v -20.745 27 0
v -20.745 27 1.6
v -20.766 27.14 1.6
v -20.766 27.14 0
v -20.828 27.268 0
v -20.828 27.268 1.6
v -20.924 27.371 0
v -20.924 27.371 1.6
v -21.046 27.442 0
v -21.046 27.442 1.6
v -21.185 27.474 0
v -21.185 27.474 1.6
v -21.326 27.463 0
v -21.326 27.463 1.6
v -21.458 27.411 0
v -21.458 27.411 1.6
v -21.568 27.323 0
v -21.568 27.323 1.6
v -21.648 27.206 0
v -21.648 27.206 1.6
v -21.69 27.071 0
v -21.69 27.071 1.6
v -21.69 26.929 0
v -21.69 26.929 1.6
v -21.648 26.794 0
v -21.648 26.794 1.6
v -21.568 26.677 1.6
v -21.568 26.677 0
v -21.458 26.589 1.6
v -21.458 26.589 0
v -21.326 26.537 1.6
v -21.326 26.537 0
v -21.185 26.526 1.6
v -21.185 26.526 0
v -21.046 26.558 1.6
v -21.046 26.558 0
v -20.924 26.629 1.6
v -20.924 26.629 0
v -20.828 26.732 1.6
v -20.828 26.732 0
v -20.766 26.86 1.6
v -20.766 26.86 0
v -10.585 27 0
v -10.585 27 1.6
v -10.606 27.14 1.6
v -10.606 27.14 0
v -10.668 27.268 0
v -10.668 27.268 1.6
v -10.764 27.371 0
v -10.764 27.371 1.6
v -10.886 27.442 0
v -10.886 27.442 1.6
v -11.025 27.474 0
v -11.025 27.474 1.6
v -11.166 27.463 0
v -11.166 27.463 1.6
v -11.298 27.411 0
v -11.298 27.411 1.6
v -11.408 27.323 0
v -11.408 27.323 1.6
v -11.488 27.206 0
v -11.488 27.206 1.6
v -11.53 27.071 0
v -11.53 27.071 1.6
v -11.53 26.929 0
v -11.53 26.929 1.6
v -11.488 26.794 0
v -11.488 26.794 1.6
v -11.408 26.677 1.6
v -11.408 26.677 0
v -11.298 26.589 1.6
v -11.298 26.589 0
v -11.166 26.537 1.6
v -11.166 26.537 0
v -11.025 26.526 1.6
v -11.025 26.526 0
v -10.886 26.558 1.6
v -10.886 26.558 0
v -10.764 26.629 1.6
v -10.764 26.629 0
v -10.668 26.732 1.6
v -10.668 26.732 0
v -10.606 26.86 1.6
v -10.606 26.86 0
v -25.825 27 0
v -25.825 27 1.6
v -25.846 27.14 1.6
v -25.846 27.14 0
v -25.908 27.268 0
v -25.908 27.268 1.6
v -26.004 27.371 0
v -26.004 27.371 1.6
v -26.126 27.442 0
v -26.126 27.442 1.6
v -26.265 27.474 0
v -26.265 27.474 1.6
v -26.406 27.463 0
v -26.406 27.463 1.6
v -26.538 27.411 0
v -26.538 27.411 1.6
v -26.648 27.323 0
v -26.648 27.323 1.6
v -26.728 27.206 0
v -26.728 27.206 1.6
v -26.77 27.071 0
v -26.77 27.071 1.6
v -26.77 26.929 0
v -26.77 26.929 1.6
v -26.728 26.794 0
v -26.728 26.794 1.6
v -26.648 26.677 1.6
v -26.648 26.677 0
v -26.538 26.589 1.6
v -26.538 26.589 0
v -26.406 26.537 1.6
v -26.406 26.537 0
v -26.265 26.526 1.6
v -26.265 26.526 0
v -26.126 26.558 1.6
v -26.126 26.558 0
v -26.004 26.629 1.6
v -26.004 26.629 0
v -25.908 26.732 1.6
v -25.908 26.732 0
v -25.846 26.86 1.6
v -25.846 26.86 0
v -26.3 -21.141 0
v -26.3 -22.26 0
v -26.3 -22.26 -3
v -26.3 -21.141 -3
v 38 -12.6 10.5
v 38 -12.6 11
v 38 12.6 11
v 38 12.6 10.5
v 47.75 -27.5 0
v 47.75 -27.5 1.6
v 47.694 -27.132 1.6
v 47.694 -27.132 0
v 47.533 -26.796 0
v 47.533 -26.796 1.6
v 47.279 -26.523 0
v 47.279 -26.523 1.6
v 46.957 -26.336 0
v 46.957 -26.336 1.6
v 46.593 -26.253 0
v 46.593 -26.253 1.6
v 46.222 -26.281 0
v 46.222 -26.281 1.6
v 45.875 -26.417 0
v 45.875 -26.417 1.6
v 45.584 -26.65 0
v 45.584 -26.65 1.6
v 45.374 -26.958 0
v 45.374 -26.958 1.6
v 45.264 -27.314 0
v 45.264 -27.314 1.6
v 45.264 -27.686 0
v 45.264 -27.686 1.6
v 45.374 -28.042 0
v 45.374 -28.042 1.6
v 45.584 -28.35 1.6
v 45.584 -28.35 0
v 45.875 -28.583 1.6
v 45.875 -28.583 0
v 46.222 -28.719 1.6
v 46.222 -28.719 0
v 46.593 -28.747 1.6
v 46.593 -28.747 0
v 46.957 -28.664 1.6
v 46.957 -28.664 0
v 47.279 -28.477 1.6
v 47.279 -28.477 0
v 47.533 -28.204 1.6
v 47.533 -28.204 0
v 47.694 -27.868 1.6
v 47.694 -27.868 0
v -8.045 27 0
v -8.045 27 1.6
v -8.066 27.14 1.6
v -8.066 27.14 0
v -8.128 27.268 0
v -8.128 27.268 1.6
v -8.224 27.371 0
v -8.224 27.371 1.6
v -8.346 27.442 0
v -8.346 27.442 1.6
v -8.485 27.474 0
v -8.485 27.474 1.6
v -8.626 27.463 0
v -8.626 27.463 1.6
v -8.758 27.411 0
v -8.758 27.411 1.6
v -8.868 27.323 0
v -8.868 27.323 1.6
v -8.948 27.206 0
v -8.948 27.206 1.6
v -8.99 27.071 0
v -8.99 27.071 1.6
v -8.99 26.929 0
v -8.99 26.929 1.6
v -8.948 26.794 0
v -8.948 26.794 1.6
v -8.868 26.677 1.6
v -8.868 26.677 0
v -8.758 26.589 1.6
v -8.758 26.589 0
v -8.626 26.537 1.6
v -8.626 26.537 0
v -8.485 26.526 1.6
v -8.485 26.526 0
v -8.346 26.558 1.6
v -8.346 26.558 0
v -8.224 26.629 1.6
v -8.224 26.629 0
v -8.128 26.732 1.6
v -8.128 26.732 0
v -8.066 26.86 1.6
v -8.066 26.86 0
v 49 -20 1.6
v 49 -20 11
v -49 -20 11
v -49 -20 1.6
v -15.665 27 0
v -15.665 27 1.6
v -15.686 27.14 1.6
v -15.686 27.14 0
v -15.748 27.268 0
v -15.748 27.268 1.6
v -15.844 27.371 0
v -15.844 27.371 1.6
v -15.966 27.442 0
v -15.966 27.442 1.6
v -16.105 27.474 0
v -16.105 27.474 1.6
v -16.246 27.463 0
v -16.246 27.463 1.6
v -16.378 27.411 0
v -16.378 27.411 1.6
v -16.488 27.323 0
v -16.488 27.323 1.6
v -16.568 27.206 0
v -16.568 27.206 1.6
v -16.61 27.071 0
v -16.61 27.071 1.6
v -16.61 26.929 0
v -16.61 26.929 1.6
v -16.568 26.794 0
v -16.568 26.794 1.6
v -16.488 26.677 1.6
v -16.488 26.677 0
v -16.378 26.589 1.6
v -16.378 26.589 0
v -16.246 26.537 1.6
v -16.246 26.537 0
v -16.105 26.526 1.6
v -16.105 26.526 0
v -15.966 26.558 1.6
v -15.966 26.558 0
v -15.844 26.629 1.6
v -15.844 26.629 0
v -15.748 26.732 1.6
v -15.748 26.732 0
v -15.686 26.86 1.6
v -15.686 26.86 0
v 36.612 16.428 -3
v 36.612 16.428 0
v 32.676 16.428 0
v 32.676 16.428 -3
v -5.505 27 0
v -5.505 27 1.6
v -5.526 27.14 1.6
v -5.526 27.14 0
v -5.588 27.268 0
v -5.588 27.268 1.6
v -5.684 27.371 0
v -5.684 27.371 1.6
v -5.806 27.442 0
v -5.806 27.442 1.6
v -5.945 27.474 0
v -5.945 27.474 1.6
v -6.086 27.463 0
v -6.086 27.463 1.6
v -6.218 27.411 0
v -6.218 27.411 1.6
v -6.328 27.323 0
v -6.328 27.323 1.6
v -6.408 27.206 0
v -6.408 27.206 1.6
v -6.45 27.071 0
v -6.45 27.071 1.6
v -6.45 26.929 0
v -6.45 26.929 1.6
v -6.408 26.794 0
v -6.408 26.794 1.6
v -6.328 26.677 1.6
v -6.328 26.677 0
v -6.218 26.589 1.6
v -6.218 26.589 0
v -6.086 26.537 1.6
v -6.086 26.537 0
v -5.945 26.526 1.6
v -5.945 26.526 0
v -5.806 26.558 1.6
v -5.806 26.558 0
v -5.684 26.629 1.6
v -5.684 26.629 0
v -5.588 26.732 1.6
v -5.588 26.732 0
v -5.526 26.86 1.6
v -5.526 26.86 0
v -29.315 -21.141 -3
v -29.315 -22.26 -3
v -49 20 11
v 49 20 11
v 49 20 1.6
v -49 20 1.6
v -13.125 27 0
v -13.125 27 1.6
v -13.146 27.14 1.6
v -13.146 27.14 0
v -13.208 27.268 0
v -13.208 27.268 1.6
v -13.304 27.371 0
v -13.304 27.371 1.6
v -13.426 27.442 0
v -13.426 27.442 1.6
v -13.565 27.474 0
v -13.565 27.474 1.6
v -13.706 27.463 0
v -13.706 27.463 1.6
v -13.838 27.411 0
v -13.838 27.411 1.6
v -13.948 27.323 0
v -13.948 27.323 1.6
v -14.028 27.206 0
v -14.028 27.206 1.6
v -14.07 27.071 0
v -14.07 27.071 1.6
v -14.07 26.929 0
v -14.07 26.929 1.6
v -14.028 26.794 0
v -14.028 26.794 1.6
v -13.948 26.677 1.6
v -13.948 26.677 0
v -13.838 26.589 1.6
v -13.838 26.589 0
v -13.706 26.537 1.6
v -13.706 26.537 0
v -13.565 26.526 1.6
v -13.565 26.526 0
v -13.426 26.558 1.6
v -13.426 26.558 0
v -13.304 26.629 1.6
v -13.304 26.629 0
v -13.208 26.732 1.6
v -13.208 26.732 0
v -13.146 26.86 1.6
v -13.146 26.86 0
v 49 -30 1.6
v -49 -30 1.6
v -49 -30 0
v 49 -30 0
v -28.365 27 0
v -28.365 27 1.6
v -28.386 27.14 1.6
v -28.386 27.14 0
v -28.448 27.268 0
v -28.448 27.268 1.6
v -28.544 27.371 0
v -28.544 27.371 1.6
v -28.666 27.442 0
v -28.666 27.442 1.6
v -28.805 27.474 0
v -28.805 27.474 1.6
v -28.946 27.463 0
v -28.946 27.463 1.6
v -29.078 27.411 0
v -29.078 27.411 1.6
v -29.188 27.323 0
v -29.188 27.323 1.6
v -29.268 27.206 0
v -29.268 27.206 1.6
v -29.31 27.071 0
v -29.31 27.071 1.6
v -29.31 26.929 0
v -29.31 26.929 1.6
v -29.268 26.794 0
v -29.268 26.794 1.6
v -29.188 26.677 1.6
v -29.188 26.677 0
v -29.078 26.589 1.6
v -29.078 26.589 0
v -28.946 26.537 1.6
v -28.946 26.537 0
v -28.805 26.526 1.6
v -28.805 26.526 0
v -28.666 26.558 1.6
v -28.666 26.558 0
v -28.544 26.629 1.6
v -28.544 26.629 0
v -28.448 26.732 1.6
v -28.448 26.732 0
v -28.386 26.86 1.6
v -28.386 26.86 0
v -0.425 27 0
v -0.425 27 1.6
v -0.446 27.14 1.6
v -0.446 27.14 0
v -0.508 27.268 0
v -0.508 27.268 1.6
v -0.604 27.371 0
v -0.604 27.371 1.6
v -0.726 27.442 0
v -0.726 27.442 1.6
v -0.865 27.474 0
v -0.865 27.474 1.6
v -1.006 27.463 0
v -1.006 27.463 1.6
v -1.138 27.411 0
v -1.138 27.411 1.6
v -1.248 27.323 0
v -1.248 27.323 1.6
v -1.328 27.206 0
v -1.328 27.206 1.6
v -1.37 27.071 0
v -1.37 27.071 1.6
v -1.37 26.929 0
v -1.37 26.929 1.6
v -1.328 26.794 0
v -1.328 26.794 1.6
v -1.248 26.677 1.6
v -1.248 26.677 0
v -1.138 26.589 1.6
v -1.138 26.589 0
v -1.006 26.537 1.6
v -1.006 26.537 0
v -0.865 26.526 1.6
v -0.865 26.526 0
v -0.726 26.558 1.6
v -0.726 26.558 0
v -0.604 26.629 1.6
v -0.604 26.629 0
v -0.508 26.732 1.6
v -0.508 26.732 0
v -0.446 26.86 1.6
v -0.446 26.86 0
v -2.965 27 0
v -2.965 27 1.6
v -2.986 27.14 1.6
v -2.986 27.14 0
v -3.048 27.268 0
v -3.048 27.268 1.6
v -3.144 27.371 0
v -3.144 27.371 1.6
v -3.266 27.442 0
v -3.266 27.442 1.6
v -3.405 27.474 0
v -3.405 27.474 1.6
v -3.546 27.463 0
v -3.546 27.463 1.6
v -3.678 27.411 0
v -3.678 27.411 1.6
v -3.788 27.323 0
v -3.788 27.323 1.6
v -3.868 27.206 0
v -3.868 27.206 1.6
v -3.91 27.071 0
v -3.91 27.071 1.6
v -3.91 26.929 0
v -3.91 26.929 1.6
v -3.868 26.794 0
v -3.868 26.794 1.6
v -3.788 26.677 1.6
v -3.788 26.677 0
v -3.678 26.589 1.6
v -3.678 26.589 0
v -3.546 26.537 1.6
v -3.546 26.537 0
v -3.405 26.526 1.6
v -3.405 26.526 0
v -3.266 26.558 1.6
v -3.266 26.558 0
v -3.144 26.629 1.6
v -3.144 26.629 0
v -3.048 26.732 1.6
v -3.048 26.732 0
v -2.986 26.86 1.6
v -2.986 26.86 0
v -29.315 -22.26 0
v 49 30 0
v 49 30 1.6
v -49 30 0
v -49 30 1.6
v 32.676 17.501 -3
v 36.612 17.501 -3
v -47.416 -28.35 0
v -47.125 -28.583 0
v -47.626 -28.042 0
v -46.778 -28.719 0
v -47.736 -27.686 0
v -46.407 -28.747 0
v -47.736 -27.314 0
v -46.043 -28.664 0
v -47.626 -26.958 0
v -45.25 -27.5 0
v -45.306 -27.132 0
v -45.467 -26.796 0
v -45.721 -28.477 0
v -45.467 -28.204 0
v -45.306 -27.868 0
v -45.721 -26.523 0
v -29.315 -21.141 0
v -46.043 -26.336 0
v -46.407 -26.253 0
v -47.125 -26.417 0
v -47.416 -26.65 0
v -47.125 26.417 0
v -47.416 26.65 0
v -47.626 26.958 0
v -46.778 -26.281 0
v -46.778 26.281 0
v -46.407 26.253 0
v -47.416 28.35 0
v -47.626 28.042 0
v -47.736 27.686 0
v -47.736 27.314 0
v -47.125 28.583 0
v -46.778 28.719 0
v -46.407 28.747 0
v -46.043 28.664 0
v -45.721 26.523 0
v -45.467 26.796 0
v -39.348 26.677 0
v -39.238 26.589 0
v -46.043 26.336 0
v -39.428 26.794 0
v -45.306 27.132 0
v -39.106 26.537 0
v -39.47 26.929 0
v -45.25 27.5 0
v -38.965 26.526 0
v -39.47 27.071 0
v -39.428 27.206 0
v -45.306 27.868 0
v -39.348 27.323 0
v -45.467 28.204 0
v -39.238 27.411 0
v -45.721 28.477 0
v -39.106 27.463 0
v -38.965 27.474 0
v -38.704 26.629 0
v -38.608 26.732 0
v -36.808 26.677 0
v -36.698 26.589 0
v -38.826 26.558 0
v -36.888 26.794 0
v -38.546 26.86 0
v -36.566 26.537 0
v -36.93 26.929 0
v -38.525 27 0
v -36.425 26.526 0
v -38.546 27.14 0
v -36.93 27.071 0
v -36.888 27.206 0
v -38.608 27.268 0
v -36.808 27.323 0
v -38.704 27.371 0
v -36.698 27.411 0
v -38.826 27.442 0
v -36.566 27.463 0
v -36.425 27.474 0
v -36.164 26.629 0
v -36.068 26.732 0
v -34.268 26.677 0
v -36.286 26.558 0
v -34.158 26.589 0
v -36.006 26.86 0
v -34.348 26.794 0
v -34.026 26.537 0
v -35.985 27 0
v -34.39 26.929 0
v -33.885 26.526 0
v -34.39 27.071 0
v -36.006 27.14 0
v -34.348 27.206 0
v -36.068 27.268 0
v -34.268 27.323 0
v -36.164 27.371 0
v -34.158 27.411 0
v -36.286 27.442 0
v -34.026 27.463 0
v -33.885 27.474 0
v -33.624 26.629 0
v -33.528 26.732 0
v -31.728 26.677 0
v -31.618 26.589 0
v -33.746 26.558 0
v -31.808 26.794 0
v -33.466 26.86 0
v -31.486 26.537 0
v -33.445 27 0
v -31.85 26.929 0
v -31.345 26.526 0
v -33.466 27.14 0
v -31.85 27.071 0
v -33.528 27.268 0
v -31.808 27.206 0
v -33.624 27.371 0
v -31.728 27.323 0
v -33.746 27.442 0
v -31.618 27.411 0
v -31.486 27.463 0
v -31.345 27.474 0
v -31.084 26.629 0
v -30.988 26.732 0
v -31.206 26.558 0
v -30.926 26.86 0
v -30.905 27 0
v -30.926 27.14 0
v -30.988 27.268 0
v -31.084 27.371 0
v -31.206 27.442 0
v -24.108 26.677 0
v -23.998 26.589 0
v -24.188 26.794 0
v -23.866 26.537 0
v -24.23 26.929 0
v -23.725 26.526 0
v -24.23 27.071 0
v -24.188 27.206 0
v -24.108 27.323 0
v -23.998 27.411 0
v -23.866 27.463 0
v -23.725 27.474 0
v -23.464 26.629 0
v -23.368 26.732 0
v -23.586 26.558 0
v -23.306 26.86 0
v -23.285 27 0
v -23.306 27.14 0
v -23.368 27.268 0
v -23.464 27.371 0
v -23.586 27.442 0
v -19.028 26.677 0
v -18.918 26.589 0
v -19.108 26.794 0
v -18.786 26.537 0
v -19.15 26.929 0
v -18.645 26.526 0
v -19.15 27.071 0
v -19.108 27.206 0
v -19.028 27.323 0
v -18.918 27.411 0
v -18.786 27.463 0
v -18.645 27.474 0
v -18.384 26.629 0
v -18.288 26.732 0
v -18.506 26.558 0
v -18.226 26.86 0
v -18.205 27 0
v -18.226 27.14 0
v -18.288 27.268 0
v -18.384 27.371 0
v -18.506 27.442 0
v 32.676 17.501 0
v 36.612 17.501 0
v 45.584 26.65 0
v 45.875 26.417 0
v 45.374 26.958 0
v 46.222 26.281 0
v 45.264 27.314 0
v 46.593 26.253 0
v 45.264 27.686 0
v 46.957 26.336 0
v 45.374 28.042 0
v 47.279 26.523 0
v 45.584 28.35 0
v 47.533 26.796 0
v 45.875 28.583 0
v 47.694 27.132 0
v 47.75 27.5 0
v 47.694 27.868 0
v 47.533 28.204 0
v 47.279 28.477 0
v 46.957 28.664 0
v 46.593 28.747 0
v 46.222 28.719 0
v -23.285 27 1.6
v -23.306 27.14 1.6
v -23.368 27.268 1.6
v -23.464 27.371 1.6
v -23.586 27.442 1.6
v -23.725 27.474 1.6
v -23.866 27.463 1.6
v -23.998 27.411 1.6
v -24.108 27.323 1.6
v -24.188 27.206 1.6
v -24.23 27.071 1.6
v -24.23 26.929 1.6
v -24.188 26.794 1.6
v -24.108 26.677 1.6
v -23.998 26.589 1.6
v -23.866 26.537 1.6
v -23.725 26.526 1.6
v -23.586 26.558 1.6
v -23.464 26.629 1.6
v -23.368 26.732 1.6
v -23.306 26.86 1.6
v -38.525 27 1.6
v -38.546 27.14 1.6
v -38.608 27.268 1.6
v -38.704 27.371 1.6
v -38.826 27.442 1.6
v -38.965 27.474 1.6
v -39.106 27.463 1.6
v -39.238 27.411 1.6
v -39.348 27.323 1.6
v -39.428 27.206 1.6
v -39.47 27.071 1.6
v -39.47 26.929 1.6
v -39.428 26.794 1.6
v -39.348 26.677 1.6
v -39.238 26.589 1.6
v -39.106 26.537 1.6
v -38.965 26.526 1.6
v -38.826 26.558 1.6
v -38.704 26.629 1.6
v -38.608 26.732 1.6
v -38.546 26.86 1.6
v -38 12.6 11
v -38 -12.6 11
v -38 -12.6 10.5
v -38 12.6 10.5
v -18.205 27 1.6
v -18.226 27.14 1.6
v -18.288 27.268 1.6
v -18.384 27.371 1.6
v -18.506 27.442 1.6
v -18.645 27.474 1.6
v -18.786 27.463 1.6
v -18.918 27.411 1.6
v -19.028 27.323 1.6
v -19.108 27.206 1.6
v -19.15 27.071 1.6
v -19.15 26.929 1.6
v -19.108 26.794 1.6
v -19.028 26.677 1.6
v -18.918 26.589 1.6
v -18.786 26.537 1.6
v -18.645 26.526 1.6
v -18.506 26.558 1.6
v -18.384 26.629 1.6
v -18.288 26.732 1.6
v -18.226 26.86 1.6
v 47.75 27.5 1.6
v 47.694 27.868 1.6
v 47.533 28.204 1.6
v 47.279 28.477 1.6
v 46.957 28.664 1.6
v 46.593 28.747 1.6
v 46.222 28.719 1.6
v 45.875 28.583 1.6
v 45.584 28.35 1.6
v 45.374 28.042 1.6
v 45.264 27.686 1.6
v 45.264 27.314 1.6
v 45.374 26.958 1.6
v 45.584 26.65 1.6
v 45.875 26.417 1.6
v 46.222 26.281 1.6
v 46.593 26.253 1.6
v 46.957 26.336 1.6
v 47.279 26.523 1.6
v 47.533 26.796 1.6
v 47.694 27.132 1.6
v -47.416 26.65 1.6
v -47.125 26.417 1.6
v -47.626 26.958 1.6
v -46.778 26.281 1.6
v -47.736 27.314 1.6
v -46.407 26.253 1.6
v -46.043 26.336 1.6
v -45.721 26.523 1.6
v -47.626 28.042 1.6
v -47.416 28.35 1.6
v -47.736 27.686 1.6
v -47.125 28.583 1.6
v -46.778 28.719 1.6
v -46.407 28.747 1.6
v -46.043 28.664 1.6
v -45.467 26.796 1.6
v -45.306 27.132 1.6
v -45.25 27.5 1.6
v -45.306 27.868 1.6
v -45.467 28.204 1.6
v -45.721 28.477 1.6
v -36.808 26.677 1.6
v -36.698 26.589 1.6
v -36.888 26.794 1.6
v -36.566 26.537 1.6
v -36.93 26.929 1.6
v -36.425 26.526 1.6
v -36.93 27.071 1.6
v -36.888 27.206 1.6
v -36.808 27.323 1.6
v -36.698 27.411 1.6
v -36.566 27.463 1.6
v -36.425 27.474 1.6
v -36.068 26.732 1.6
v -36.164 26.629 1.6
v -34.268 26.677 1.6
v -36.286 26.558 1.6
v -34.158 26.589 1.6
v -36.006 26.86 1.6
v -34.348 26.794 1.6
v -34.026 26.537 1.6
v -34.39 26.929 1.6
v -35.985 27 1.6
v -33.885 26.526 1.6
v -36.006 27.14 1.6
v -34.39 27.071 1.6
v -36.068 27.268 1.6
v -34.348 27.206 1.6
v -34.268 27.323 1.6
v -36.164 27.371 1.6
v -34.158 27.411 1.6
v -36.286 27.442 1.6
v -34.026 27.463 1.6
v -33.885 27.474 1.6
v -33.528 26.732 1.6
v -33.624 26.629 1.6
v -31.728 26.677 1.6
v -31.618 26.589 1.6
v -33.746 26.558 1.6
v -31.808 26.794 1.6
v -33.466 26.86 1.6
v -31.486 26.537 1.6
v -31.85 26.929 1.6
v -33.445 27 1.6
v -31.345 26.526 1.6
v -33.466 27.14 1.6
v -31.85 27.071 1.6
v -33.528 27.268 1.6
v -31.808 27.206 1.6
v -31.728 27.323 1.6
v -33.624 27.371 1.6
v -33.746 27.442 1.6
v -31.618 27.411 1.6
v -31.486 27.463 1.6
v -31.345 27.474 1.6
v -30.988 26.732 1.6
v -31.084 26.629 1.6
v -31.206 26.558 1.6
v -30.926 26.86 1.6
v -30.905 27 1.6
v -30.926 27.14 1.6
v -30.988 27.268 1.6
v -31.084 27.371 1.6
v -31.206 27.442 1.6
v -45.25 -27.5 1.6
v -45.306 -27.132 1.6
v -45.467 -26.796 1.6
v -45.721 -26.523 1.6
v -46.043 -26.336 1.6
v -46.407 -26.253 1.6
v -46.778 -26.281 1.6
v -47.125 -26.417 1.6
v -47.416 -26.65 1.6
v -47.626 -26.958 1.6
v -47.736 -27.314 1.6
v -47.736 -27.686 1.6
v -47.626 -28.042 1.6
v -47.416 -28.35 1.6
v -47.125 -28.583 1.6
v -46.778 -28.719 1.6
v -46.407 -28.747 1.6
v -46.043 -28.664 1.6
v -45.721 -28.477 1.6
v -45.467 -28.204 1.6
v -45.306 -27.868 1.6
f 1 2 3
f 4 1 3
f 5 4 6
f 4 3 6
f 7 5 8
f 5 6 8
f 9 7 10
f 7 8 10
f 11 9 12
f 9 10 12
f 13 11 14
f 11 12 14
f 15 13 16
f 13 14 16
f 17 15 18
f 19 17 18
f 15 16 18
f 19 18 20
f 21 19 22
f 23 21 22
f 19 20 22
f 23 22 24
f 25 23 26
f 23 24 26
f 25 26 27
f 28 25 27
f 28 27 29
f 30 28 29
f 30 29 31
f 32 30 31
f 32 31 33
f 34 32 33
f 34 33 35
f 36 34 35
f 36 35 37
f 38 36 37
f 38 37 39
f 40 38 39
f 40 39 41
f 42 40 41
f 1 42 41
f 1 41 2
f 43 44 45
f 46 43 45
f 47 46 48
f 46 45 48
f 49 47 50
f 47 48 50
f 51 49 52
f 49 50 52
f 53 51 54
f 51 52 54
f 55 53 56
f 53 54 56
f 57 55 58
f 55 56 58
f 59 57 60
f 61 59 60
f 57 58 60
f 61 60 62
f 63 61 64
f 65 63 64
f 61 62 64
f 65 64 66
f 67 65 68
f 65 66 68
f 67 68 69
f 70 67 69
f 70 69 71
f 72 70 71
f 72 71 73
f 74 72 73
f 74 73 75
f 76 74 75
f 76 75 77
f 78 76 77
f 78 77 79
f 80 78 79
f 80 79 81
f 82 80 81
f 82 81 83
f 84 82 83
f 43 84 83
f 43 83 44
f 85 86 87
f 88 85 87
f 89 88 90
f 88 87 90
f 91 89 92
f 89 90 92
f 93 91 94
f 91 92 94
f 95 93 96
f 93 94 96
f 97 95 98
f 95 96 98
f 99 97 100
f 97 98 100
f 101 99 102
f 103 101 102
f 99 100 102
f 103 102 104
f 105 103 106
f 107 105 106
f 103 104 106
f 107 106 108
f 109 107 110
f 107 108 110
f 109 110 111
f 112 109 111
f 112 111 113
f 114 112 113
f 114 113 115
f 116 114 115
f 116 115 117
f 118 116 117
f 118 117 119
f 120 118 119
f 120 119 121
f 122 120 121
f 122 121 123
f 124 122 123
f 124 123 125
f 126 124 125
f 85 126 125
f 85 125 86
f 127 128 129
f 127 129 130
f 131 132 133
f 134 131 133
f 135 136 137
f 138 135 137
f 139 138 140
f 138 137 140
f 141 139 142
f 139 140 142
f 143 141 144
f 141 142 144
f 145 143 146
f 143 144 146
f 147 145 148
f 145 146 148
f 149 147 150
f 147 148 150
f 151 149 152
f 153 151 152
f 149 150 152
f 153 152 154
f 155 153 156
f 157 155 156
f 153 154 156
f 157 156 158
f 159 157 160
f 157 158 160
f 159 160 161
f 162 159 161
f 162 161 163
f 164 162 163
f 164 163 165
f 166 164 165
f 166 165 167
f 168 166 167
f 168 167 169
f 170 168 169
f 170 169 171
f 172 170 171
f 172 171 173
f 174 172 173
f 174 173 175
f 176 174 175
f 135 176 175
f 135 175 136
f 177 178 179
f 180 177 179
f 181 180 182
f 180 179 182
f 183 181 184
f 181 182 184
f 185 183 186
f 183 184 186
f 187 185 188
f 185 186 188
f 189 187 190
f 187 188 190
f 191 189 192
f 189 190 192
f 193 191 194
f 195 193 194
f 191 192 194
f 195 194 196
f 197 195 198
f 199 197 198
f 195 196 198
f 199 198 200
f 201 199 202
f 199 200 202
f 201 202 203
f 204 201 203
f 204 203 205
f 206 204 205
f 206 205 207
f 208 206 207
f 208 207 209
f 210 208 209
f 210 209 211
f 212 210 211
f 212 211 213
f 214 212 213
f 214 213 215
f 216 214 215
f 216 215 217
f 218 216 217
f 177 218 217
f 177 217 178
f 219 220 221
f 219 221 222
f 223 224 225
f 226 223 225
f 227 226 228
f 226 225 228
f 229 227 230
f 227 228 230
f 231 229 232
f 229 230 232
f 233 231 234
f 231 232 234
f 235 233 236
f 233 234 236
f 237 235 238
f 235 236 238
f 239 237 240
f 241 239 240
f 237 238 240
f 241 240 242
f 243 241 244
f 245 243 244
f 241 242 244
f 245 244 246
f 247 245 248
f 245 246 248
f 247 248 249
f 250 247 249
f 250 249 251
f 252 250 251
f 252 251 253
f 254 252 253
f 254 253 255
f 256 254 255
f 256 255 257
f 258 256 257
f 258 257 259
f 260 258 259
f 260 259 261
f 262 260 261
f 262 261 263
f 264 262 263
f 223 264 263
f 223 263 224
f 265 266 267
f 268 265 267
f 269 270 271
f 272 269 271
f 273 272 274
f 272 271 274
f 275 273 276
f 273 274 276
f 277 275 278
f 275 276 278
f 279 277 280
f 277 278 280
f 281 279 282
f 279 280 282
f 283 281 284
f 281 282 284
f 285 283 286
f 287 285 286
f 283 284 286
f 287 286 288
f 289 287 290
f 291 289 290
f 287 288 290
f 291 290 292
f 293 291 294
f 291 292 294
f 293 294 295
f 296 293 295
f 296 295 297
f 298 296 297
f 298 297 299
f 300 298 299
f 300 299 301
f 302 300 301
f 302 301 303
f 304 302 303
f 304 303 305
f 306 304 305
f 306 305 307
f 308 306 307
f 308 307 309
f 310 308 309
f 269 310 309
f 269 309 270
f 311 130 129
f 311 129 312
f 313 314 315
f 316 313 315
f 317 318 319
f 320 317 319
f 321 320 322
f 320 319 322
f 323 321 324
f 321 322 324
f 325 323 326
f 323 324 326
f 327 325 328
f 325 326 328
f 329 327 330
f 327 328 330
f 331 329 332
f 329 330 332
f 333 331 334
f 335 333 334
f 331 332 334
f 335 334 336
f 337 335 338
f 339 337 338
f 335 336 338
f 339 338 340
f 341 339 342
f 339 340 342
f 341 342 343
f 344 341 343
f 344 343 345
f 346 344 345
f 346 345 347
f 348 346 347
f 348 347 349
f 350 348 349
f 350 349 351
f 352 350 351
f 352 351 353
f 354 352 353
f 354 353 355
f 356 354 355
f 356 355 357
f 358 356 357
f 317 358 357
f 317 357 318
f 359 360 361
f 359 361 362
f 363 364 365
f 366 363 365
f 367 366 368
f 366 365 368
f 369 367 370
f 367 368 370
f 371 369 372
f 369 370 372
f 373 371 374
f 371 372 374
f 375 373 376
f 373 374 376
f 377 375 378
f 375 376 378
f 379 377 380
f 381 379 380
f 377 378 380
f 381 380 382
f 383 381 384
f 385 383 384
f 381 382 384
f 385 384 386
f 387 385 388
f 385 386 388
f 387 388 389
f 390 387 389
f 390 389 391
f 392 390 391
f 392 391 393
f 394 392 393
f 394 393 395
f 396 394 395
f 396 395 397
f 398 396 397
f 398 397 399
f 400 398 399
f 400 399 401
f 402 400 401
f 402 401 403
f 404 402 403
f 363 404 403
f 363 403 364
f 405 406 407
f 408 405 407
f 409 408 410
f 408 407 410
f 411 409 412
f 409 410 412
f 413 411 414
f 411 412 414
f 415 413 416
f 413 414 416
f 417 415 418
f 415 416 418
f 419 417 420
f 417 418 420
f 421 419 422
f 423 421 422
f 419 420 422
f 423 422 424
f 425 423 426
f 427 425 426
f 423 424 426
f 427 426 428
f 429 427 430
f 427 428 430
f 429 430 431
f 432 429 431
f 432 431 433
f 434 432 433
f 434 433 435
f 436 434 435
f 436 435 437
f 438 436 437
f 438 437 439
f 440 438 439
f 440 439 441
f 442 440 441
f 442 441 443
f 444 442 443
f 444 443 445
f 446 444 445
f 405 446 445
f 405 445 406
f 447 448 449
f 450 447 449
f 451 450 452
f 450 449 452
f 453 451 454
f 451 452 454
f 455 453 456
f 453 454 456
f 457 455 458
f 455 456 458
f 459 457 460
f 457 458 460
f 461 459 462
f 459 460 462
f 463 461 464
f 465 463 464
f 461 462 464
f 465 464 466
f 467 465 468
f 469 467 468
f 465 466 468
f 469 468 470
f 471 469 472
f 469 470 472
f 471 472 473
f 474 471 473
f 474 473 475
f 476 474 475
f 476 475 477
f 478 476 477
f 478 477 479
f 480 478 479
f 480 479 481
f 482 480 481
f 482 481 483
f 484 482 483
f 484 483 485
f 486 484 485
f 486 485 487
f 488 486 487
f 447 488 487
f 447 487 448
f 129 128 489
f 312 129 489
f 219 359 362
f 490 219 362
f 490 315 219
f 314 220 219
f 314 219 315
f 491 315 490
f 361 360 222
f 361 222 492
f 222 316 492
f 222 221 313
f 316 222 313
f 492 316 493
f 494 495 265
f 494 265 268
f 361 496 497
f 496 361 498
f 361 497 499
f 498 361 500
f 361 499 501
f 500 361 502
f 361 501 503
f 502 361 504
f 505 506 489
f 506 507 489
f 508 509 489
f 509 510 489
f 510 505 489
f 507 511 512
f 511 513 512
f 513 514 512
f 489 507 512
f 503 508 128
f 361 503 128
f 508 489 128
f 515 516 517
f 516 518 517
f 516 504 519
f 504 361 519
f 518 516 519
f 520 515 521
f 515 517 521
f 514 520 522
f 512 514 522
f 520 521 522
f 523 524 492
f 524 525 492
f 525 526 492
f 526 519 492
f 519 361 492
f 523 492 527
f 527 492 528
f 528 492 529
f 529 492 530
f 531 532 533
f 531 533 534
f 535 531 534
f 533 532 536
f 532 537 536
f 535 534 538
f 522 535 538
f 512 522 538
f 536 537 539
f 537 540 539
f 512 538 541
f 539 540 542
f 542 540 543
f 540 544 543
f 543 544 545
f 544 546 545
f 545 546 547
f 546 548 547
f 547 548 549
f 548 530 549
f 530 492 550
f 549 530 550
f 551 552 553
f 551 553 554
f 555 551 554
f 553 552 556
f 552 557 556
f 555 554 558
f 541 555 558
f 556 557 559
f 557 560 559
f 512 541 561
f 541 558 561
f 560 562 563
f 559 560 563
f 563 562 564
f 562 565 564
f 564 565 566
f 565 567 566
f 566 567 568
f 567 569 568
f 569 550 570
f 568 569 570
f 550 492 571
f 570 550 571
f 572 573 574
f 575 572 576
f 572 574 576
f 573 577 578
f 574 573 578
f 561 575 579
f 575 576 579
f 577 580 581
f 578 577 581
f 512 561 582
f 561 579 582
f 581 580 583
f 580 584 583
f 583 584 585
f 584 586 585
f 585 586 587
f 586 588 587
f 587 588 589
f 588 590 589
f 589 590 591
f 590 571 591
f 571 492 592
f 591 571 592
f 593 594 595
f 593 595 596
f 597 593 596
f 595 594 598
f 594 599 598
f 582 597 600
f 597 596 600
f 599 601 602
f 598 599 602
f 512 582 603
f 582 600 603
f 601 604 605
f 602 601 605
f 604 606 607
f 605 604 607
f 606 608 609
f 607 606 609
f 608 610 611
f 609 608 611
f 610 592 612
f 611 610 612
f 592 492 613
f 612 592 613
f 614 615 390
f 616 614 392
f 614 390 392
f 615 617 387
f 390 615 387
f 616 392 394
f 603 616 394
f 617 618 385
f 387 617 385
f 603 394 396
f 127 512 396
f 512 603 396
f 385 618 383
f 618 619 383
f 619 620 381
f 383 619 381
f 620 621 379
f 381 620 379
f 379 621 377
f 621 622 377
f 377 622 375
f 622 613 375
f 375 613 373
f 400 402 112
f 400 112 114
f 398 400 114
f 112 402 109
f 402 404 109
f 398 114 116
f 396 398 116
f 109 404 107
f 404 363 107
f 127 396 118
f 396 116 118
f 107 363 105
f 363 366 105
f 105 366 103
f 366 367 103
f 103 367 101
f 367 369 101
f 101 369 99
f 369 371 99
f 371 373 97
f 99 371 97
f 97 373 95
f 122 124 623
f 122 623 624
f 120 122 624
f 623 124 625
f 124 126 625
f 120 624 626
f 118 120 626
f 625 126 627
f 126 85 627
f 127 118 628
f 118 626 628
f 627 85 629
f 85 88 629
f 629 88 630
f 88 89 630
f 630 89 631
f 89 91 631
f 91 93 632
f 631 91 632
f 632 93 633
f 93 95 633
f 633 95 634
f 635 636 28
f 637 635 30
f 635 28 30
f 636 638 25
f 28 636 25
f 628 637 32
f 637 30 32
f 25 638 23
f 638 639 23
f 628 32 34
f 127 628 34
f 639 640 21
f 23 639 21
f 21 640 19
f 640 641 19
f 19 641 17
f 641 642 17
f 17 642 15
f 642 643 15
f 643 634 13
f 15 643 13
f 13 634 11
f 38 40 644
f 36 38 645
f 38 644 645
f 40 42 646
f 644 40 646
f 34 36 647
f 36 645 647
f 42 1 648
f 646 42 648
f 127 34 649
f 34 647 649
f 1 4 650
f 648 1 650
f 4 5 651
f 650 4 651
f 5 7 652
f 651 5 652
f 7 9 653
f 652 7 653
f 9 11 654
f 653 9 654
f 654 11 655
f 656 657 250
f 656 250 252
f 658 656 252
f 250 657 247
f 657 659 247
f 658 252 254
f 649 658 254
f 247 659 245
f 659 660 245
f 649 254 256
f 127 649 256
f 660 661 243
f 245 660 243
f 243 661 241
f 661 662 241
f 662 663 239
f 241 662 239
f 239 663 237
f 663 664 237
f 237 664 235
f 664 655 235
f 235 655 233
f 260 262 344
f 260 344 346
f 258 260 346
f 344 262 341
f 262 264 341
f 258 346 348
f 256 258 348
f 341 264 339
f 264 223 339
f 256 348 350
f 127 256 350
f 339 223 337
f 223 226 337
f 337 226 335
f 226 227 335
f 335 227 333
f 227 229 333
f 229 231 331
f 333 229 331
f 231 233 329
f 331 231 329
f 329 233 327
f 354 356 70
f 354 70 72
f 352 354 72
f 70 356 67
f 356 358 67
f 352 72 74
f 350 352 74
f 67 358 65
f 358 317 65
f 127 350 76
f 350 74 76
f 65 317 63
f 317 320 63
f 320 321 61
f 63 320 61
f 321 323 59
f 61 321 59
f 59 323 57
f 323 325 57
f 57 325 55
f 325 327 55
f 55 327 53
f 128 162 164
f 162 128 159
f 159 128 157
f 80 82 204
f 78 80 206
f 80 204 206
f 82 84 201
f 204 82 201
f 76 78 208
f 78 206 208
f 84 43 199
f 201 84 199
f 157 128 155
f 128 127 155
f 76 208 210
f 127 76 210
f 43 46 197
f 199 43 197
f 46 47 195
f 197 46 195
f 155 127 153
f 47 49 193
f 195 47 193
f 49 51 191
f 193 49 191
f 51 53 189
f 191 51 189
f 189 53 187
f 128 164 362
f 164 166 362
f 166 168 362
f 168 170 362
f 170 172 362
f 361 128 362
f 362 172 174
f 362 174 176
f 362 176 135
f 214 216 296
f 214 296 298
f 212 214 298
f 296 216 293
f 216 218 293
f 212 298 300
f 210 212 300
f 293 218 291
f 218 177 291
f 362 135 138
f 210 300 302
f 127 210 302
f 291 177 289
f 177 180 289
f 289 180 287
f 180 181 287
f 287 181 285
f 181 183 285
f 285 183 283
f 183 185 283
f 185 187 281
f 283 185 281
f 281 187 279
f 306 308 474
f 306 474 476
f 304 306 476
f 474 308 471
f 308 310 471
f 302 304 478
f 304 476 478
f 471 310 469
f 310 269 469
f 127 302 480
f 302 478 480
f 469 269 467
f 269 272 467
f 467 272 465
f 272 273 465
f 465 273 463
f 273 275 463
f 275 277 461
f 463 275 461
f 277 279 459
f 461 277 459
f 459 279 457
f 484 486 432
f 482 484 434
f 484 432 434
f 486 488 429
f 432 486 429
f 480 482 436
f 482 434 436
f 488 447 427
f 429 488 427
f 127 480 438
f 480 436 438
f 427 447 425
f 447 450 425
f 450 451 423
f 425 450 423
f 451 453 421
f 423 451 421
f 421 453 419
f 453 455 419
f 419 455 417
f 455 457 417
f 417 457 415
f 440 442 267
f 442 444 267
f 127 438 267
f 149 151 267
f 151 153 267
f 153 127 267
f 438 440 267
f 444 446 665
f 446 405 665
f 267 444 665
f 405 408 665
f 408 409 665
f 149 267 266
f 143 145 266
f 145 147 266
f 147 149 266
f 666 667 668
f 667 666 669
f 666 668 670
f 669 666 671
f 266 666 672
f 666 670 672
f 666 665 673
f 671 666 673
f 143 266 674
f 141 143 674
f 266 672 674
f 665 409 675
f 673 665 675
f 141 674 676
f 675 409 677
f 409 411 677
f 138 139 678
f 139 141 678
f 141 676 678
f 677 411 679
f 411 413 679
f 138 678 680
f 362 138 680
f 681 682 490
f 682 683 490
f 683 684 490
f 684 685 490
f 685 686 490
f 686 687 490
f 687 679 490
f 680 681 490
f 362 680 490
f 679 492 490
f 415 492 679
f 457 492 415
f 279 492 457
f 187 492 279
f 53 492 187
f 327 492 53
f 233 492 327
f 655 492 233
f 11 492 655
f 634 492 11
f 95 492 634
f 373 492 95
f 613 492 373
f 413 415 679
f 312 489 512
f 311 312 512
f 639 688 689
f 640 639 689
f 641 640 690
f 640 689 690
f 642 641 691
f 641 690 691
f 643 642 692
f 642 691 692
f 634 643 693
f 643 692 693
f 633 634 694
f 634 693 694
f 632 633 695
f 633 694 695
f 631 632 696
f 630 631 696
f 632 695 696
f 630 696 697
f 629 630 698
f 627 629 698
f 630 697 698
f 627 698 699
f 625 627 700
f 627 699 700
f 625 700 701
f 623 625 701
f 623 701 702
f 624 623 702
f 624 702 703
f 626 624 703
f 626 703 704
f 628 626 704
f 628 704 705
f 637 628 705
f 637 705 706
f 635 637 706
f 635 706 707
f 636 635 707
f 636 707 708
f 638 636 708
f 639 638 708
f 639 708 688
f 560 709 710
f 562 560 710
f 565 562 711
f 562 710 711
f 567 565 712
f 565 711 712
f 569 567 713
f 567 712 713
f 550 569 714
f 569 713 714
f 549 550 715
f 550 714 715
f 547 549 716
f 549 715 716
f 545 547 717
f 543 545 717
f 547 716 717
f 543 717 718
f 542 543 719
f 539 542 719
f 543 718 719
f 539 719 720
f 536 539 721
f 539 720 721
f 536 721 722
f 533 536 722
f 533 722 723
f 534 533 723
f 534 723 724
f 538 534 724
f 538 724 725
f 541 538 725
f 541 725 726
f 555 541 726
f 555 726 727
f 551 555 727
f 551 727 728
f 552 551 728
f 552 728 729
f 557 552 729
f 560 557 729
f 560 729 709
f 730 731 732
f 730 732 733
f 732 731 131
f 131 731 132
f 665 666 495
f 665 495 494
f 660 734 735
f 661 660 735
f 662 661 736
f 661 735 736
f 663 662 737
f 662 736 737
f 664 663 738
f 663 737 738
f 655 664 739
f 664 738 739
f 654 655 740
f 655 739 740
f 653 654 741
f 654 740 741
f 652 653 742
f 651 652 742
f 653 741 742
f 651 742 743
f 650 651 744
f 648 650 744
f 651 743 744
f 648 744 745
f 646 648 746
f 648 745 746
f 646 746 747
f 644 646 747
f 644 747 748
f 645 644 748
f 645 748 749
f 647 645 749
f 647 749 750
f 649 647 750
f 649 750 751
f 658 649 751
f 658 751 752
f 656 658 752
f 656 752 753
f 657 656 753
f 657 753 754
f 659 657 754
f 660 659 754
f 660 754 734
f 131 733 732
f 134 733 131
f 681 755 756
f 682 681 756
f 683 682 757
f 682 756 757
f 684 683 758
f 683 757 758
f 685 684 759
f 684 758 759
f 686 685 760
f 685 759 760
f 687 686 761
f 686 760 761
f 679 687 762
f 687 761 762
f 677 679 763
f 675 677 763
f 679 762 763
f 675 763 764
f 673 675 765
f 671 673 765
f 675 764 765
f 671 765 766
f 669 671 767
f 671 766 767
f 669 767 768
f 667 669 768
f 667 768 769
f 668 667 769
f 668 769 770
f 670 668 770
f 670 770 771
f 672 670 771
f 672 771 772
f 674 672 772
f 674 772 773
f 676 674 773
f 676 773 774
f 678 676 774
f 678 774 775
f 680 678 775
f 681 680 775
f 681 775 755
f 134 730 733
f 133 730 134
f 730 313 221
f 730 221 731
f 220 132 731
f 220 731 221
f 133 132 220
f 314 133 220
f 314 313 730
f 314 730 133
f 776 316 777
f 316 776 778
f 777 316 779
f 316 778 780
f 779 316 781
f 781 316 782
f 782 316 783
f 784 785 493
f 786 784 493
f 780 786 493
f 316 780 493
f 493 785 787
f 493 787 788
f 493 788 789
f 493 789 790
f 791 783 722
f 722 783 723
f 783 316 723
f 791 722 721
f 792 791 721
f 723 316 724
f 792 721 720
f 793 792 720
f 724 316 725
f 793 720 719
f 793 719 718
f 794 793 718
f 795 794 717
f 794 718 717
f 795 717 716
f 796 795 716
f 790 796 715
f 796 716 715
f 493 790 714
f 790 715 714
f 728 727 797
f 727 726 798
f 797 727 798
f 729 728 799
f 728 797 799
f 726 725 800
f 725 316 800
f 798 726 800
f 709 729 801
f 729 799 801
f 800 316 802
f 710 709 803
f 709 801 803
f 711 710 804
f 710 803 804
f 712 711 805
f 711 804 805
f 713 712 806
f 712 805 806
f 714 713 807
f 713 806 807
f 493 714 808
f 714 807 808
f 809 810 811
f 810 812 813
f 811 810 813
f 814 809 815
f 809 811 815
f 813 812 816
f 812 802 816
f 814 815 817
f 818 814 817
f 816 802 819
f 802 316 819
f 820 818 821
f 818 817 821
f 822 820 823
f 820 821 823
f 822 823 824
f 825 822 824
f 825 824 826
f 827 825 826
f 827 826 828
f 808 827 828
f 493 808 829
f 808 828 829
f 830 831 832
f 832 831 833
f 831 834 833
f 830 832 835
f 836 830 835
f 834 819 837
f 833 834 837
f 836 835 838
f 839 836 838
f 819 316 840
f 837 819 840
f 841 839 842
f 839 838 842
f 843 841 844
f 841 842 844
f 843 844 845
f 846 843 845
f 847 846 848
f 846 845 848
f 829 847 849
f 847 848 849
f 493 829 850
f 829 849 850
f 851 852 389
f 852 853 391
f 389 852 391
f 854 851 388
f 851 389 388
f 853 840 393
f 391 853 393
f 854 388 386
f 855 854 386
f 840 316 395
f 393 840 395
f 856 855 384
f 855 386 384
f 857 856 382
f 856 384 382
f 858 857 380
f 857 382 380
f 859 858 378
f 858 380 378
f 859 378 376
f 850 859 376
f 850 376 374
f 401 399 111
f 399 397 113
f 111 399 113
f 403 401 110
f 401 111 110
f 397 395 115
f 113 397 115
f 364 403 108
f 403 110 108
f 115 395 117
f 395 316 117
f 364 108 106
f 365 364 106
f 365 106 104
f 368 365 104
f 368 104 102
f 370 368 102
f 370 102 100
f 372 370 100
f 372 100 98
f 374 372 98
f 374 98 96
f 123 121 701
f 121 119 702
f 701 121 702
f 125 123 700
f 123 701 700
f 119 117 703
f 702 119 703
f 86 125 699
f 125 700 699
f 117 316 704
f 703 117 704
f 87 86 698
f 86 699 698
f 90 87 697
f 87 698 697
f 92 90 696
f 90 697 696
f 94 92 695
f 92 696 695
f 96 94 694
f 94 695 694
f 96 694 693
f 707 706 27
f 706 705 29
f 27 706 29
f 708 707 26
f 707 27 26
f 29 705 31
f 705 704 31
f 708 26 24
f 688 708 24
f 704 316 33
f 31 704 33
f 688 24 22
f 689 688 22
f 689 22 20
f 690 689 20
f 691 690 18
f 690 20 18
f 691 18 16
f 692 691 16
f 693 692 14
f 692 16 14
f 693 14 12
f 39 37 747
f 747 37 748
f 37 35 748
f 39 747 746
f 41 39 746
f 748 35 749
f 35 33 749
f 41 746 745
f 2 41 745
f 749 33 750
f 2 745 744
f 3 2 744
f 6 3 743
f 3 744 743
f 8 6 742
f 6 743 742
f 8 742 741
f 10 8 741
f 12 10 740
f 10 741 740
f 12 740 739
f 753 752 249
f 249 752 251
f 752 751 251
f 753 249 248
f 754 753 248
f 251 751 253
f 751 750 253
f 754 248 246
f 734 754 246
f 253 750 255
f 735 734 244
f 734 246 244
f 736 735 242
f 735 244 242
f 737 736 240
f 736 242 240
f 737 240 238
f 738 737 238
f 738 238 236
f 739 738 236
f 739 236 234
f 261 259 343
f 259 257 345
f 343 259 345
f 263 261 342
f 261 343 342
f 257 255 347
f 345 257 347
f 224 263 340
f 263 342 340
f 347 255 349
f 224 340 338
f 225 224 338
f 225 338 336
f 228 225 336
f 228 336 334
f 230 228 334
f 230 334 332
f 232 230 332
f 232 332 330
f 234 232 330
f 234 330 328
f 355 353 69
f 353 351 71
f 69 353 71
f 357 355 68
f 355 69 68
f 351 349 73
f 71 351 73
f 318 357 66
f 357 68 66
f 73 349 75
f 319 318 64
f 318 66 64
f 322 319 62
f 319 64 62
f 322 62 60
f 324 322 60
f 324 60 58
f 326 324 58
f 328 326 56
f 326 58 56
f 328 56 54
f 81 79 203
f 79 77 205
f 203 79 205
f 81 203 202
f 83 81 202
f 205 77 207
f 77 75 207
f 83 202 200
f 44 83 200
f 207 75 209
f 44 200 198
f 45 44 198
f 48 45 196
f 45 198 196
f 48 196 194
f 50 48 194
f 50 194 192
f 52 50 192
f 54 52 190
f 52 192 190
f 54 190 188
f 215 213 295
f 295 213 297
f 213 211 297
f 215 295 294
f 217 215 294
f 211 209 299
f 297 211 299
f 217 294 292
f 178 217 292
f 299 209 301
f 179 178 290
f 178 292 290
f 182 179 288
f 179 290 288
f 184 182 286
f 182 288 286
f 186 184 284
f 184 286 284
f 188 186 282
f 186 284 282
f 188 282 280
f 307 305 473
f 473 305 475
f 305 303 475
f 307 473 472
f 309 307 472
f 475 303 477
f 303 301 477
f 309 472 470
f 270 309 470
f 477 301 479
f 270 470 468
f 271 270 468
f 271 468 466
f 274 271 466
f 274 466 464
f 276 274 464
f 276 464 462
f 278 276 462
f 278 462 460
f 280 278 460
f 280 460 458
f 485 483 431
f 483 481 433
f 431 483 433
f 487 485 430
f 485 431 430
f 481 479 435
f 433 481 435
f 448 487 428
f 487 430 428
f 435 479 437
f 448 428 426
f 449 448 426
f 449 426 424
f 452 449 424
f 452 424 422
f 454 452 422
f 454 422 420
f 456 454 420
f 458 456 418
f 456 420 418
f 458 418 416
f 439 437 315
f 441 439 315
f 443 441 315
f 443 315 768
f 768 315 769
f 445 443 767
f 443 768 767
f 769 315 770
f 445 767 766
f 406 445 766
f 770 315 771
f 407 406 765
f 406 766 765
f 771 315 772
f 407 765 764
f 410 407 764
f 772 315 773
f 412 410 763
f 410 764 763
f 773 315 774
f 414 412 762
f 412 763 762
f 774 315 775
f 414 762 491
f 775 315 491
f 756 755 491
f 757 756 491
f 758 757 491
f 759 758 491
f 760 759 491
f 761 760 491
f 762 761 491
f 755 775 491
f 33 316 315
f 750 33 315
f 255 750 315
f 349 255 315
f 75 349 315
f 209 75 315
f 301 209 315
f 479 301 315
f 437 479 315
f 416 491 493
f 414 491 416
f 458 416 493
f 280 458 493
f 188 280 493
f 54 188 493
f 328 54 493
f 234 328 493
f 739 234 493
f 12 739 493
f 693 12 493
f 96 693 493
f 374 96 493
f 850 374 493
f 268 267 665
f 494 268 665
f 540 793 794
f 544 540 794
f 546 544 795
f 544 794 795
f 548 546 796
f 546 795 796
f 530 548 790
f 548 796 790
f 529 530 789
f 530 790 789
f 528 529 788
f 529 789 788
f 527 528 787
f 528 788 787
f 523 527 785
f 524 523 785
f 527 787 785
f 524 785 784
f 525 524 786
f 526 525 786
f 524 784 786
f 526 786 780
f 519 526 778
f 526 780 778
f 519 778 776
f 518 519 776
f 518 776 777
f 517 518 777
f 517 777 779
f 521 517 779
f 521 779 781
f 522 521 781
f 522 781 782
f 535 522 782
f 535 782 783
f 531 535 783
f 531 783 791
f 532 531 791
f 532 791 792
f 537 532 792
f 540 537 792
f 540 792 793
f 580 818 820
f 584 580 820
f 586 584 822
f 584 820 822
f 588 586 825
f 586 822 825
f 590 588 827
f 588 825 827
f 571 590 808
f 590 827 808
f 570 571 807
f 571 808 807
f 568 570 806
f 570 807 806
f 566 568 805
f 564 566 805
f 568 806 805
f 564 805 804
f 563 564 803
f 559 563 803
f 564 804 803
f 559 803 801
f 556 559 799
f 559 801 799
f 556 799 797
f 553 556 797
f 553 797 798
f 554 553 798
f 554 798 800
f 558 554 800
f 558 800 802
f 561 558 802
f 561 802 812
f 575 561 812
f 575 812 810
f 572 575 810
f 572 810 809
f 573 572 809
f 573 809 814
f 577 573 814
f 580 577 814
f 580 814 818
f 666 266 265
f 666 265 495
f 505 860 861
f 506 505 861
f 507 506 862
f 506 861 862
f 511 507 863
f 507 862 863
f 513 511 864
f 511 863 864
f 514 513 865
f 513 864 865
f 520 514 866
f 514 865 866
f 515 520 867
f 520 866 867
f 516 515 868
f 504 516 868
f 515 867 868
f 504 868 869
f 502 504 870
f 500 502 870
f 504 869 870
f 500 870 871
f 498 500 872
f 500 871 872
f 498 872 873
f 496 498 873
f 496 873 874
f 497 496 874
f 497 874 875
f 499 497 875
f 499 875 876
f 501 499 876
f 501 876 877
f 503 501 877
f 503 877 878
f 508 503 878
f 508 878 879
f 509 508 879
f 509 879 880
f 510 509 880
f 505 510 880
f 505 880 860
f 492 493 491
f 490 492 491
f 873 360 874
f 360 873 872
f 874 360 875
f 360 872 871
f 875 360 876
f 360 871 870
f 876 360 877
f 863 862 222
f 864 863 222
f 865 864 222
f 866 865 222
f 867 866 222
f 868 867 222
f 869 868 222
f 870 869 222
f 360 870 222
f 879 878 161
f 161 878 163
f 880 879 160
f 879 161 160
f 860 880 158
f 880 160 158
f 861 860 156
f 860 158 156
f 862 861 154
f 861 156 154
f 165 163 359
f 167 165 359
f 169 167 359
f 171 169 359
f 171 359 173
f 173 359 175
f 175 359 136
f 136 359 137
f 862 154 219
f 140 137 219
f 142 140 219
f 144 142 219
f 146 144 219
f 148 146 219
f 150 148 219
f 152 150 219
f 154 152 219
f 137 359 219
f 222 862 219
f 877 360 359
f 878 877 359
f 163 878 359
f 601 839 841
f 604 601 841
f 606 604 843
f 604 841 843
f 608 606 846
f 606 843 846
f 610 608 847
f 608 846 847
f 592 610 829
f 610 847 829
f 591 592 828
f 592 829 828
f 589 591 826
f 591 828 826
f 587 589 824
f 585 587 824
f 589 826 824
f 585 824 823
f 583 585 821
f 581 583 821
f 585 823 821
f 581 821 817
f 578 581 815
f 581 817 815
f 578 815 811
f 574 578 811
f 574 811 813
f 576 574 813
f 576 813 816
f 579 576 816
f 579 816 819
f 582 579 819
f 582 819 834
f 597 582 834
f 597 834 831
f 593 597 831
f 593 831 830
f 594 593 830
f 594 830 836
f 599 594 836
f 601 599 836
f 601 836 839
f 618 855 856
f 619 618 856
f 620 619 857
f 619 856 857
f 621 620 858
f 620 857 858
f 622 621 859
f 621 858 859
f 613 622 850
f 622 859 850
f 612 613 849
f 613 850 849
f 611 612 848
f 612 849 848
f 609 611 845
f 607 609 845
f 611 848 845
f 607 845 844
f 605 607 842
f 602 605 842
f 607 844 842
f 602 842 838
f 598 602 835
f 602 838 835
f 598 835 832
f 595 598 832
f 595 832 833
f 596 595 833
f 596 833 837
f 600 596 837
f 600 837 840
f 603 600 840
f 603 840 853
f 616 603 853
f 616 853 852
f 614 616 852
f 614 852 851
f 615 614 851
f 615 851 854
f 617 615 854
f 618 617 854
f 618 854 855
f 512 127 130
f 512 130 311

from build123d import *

# Parameters (mm, degrees)
SKETCH1_W                        = 98
SKETCH1_H                        = 60
BOSS_EXTRUDE1_DEPTH              = 11
SKETCH2_W                        = 9.4
SKETCH2_H                        = 10
CUT_EXTRUDE1_DEPTH               = 99
SKETCH3_W                        = 9.4
SKETCH3_H                        = 10
CUT_EXTRUDE2_DEPTH               = 99
SKETCH4_W                        = 3.935514966
SKETCH4_H                        = 1.073322306
BOSS_EXTRUDE2_DEPTH              = 3
SKETCH5_W                        = 3.015
SKETCH5_H                        = 1.118767377
BOSS_EXTRUDE3_DEPTH              = 3
SKETCH6_W                        = 76
SKETCH6_H                        = 25.2
CUT_EXTRUDE3_DEPTH               = 0.5
F_2_5_2_5_DIAMETER_HOLE1_D       = 2.5
F_2_5_2_5_DIAMETER_HOLE1_DEPTH   = 11
F_0_95_0_95_DIAMETER_HOLE1_D     = 0.95
F_0_95_0_95_DIAMETER_HOLE1_DEPTH = 11


with BuildPart() as part:
    # Sketch1 → Boss-Extrude1 (new body)
    with BuildSketch(Plane.XY.offset(11)):
        Rectangle(SKETCH1_W, SKETCH1_H)
    extrude(amount=-BOSS_EXTRUDE1_DEPTH)

    # Sketch2 → Cut-Extrude1 (cut, through all)
    with BuildSketch(Plane(origin=(49, 0, 0), x_dir=(0, 0, -1), z_dir=(1, 0, 0))):
        with Locations((-6.3, -25)):
            Rectangle(SKETCH2_W, SKETCH2_H)
    extrude(amount=-CUT_EXTRUDE1_DEPTH, mode=Mode.SUBTRACT)

    # Sketch3 → Cut-Extrude2 (cut, through all)
    with BuildSketch(Plane(origin=(49, 0, 0), x_dir=(0, 0, -1), z_dir=(1, 0, 0))):
        with Locations((-6.3, 25)):
            Rectangle(SKETCH3_W, SKETCH3_H)
    extrude(amount=-CUT_EXTRUDE2_DEPTH, mode=Mode.SUBTRACT)

    # Sketch4 → Boss-Extrude2 (add)
    with BuildSketch(Plane(origin=(0, 0, 0), x_dir=(-1, 0, 0), z_dir=(0, 0, -1))):
        with Locations((-34.644135617, 16.964786449)):
            Rectangle(SKETCH4_W, SKETCH4_H)
    extrude(amount=BOSS_EXTRUDE2_DEPTH)

    # Sketch5 → Boss-Extrude3 (add)
    with BuildSketch(Plane(origin=(0, 0, 0), x_dir=(-1, 0, 0), z_dir=(0, 0, -1))):
        with Locations((27.8075, -21.700286291)):
            Rectangle(SKETCH5_W, SKETCH5_H)
    extrude(amount=BOSS_EXTRUDE3_DEPTH)

    # Sketch6 → Cut-Extrude3 (cut)
    with BuildSketch(Plane.XY.offset(11)):
        Rectangle(SKETCH6_W, SKETCH6_H)
    extrude(amount=-CUT_EXTRUDE3_DEPTH, mode=Mode.SUBTRACT)

    # Ø2.5 (2.5) Diameter Hole1
    with Locations(Plane(origin=(0, 0, 0), x_dir=(-1, 0, 0), z_dir=(0, 0, -1))):
        with Locations((46.5, -27.5), (-46.5, -27.5), (-46.5, 27.5), (46.5, 27.5)):
            Hole(F_2_5_2_5_DIAMETER_HOLE1_D / 2, depth=F_2_5_2_5_DIAMETER_HOLE1_DEPTH)

    # Ø0.95 (0.95) Diameter Hole1
    with Locations(Plane(origin=(0, 0, 0), x_dir=(-1, 0, 0), z_dir=(0, 0, -1))):
        with Locations((0.9, 27), (3.44, 27), (5.98, 27), (8.52, 27), (11.06, 27), (13.6, 27), (16.14, 27), (18.68, 27), (21.22, 27), (23.76, 27), (26.3, 27), (28.84, 27), (31.38, 27), (33.92, 27), (36.46, 27), (39, 27)):
            Hole(F_0_95_0_95_DIAMETER_HOLE1_D / 2, depth=F_0_95_0_95_DIAMETER_HOLE1_DEPTH)


solid = part.part
